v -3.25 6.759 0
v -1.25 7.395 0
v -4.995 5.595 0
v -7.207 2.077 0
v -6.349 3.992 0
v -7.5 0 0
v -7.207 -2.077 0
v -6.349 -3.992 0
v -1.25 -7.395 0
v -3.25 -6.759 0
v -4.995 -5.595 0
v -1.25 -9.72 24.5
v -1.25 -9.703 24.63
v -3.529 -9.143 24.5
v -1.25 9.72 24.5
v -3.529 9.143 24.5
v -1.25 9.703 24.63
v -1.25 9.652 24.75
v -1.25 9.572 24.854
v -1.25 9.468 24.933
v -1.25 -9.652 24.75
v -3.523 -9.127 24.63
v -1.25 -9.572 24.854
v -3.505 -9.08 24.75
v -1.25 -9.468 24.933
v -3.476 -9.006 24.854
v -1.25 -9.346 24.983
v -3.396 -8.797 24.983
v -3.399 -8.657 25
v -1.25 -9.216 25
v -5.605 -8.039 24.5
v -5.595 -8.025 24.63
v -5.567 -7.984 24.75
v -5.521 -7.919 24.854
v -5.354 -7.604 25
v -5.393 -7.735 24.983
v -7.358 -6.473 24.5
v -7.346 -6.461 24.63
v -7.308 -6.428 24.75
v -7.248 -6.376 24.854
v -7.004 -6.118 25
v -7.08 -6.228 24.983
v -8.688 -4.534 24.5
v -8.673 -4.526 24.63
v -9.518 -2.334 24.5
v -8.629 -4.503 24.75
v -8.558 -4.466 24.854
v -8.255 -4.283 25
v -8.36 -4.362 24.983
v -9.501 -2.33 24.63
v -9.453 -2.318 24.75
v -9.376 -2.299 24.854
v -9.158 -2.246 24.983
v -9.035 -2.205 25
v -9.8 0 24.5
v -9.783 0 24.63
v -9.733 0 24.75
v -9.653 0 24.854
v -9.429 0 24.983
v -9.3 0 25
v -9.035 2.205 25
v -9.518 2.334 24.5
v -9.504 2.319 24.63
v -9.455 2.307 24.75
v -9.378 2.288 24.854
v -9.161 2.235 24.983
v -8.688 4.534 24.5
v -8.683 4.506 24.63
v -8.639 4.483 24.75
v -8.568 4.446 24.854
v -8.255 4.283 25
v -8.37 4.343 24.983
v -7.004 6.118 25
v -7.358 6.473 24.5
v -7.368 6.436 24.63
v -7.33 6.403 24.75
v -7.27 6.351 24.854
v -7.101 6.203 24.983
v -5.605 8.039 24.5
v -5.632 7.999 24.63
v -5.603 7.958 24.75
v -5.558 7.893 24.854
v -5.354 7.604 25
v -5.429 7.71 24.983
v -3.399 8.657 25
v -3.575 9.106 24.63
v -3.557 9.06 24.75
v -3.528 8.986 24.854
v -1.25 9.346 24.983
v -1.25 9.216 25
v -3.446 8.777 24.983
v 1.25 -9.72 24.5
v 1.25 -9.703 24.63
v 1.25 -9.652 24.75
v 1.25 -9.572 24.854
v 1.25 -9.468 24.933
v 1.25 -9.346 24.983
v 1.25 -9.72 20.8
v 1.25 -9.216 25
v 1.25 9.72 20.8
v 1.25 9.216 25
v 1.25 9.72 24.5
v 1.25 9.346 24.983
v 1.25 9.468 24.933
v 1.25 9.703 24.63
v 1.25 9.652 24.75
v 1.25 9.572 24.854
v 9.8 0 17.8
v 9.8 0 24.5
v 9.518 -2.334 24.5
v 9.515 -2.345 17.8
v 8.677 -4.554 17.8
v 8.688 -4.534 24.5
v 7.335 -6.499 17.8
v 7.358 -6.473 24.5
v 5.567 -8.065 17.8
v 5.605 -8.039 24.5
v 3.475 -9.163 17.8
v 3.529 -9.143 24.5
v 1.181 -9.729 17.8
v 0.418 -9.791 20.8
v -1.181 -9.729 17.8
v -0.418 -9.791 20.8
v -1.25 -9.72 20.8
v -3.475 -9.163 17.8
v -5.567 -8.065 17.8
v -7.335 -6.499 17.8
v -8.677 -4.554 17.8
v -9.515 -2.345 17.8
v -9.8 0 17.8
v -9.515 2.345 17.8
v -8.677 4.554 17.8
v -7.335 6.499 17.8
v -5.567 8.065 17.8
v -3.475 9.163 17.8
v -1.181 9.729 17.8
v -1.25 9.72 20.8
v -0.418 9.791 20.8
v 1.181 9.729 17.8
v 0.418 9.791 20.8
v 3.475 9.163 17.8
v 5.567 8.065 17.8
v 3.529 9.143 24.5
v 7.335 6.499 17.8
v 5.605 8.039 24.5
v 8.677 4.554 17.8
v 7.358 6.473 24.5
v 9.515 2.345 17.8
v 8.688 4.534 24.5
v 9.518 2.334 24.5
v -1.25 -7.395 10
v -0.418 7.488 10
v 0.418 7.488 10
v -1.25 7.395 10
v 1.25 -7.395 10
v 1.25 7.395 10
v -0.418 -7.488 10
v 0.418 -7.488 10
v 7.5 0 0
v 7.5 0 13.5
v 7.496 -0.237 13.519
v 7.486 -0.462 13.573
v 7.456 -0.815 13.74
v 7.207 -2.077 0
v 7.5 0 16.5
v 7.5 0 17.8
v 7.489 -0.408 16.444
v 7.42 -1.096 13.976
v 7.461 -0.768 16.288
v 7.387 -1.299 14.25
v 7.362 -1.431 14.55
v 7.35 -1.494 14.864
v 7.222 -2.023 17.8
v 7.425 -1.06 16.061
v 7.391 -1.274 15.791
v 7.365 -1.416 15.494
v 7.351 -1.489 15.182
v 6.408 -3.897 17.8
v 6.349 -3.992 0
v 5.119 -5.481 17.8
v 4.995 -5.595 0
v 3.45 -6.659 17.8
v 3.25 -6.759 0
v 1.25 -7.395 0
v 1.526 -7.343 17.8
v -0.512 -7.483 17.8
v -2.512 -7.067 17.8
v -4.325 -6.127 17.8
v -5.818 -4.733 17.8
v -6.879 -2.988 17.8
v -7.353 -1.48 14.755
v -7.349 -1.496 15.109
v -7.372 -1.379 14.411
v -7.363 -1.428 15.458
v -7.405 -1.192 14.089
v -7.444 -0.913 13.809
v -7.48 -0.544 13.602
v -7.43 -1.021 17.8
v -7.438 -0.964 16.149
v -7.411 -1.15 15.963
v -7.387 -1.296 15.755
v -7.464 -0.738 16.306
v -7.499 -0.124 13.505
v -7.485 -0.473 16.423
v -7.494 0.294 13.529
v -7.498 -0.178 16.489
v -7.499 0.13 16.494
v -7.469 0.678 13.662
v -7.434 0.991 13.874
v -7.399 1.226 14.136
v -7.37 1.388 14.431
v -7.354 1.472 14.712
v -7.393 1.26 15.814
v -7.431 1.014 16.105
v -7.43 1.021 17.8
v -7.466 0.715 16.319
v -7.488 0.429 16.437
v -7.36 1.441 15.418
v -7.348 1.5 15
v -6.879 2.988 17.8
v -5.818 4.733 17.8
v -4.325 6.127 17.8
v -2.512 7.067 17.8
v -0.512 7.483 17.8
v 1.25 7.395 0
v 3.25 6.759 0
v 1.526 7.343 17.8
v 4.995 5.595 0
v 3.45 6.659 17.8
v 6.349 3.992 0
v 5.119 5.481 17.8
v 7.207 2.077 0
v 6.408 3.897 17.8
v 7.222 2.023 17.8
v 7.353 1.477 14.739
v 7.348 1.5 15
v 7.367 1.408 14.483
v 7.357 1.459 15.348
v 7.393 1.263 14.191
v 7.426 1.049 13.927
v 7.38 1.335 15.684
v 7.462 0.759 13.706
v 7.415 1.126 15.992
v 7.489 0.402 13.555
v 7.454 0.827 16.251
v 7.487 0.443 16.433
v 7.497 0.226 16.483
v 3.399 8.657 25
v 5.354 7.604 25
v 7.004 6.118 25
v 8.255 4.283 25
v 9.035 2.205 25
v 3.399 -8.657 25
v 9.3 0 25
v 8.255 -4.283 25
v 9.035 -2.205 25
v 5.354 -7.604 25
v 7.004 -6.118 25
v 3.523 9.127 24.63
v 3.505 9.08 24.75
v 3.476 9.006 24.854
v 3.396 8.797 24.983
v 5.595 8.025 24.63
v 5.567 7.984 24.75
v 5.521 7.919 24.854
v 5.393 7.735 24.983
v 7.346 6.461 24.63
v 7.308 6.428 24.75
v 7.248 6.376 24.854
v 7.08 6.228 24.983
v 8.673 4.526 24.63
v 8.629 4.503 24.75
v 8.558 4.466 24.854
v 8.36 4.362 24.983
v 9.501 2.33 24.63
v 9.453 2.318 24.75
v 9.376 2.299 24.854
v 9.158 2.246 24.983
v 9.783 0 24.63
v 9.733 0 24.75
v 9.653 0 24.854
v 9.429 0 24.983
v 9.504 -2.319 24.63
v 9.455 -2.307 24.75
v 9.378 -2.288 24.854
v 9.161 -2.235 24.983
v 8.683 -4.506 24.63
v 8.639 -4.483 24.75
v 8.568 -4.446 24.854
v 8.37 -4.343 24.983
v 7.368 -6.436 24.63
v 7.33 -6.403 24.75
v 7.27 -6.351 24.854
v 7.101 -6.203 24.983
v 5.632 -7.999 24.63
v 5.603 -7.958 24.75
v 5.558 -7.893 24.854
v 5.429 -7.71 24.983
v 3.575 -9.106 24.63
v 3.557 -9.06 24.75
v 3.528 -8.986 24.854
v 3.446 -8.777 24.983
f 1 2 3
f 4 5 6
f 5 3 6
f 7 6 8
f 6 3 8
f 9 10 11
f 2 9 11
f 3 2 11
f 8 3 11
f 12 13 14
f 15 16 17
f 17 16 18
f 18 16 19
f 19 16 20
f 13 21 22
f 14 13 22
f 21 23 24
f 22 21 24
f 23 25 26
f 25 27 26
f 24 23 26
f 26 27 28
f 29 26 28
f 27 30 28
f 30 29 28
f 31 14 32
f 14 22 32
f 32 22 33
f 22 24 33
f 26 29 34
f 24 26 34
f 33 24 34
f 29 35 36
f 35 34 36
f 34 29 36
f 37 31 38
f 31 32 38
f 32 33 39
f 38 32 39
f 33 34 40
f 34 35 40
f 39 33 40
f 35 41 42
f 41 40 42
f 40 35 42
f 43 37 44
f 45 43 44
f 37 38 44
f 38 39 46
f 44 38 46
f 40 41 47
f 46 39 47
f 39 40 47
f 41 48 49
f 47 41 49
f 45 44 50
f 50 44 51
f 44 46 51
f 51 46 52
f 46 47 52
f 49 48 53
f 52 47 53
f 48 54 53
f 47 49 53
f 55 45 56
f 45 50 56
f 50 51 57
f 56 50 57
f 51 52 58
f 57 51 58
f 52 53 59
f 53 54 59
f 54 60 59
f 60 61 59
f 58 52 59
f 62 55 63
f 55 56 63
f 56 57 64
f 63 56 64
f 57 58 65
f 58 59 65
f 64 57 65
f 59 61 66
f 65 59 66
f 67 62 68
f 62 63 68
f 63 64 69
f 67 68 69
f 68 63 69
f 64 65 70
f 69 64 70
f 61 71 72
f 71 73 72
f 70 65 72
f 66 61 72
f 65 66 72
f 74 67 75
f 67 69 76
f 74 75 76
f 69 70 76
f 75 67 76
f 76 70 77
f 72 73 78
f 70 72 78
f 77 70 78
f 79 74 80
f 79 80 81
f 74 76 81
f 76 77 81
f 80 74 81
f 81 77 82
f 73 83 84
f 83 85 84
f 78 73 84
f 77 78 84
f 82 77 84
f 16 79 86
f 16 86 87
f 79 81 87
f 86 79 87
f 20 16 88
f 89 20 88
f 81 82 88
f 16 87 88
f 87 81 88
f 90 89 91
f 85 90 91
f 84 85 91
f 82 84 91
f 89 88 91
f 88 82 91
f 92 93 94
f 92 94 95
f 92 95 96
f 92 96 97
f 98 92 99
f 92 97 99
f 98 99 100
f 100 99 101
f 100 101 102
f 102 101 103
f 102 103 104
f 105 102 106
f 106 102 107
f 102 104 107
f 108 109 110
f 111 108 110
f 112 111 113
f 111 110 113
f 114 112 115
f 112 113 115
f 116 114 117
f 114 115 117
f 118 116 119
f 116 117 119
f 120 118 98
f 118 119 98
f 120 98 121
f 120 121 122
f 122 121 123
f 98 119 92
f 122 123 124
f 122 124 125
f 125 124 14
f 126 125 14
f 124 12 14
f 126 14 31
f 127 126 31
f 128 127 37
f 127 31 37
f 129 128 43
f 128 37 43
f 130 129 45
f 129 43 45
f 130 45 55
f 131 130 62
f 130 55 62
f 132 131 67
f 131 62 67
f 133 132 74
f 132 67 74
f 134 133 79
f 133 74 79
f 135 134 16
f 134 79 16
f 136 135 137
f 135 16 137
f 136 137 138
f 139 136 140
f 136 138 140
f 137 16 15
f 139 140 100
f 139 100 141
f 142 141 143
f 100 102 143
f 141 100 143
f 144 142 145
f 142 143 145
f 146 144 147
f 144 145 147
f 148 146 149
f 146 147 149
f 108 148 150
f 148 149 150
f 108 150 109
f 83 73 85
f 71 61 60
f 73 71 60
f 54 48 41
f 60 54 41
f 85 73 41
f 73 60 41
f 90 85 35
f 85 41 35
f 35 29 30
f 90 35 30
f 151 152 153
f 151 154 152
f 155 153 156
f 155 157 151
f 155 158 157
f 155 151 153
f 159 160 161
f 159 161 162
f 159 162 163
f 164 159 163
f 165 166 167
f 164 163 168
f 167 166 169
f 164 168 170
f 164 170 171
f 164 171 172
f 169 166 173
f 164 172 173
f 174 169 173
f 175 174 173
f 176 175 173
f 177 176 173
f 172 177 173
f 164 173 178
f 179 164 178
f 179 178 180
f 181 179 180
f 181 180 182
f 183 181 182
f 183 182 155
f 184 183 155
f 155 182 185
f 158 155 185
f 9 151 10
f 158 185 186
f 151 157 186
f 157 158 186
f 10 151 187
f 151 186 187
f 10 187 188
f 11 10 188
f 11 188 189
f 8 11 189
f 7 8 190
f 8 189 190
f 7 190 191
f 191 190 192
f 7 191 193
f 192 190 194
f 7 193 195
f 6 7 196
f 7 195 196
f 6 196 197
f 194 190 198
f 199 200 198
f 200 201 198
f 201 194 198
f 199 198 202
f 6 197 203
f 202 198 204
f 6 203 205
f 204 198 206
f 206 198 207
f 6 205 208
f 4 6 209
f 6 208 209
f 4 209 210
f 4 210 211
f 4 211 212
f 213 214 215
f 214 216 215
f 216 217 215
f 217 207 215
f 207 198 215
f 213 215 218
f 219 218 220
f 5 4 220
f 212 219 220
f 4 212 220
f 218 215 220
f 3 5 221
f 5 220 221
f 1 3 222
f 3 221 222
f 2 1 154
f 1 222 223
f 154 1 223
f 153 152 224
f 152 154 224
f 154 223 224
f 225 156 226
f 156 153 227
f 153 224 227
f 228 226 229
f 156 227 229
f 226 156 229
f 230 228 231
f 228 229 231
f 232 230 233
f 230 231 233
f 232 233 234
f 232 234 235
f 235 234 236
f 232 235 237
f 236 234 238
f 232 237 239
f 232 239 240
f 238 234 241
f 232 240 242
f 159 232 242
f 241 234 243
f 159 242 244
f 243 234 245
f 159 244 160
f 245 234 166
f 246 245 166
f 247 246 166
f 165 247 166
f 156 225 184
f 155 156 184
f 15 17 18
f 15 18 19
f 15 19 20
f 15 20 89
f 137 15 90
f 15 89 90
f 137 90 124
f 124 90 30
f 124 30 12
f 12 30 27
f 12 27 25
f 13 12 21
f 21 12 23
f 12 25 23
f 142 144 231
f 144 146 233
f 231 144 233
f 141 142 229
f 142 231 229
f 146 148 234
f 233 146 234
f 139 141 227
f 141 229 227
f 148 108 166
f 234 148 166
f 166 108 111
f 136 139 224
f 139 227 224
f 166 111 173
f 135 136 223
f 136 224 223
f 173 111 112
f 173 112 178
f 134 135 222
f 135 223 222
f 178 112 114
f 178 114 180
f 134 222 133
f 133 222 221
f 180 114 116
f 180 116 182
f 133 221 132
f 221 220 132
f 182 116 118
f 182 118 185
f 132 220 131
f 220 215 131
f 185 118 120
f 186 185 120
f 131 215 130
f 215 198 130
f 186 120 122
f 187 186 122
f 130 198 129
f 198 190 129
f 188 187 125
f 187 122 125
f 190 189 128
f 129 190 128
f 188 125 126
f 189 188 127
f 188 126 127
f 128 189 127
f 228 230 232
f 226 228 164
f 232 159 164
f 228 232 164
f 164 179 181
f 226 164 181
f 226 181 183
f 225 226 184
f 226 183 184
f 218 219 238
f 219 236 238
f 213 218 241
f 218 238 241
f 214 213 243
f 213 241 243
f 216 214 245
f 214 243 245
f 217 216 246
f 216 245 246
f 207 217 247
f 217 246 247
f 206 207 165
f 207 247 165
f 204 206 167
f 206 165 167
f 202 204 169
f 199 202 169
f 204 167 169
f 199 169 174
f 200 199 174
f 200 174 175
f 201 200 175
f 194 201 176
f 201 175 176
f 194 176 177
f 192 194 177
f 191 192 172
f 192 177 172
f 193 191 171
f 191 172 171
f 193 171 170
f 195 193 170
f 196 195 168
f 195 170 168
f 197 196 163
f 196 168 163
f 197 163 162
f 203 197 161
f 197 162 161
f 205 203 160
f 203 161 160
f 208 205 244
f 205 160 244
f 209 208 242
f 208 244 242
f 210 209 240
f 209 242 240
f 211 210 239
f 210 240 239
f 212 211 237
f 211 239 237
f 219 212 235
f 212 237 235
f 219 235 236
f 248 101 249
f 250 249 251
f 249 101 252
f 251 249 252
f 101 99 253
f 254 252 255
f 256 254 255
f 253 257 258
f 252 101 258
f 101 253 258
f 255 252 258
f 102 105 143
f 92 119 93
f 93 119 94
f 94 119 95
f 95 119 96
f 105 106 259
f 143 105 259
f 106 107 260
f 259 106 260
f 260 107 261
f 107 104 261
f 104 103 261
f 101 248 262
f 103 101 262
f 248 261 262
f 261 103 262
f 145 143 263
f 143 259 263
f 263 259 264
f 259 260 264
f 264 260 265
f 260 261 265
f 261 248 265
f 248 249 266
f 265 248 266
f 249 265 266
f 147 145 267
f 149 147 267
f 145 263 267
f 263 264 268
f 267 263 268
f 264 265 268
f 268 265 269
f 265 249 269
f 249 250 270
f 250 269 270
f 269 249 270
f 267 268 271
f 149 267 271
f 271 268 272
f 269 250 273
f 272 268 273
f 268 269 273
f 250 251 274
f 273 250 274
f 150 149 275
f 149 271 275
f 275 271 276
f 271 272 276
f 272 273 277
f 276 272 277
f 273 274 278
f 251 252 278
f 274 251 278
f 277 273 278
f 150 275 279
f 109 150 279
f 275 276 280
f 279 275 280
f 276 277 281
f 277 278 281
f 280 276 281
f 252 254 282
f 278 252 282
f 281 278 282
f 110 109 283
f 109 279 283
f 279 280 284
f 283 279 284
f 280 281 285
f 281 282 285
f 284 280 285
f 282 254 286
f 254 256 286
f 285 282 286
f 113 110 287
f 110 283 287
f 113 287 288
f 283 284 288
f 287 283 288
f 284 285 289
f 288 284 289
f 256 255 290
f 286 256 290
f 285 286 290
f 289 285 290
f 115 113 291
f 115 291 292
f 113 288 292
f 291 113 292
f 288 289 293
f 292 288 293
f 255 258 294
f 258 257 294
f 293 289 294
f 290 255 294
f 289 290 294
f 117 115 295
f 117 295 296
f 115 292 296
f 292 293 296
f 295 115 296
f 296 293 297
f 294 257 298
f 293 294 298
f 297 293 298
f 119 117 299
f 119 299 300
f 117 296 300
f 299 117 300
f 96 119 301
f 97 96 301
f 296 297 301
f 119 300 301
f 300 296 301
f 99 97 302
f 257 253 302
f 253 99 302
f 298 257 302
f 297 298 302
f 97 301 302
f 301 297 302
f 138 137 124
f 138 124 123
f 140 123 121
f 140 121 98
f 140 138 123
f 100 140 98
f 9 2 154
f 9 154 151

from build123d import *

# Parameters (mm, degrees)
F3_DEPTH = 4.2
F4_R     = 0.5
F5_W     = 2.5
F5_H     = 20
F6_DEPTH = 10
F7_R     = 1.5
F8_DEPTH = 12.5


with BuildPart() as f1:
    # F0 (on Front) → F1 (revolve)
    with BuildSketch(Plane.XZ):
        Polygon((0, 25), (0, 0), (7.5, 0), (7.5, 17.8), (9.8, 17.8), (9.8, 25), align=None)
    revolve(axis=Axis((0, 0, 12.5), (0, 0, -1)))

    # F2 (on face) → F3 (cut)
    with BuildSketch(Plane.XY.offset(25)):
        with BuildLine():
            Line((1.25, 15), (-1.25, 15))
            Line((-1.25, 15), (-1.25, 9.7199537036))
            ThreePointArc((-1.25, 9.7199537036), (0, 9.8), (1.25, 9.7199537036))
            Line((1.25, 9.7199537036), (1.25, 15))
        make_face()
        with BuildLine():
            ThreePointArc((1.25, 9.7199537036), (0, 9.8), (-1.25, 9.7199537036))
            Line((-1.25, 9.7199537036), (-1.25, -9.7199537036))
            ThreePointArc((-1.25, -9.7199537036), (0, -9.8), (1.25, -9.7199537036))
            Line((1.25, -9.7199537036), (1.25, 9.7199537036))
        make_face()
        with BuildLine():
            ThreePointArc((1.25, -9.7199537036), (0, -9.8), (-1.25, -9.7199537036))
            Line((-1.25, -9.7199537036), (-1.25, -15))
            Line((-1.25, -15), (1.25, -15))
            Line((1.25, -15), (1.25, -9.7199537036))
        make_face()
    extrude(amount=-F3_DEPTH, mode=Mode.SUBTRACT)

    # F4
    f4_edges = [f1.edges().sort_by_distance(p)[0] for p in [
        (-9.8, 0, 25),
        (7.358329, -6.472635, 25),
        (7.358329, 6.472635, 25),
    ]]
    fillet(f4_edges, radius=F4_R)

    # F5 (on face) → F6 (cut)
    with BuildSketch(Plane(origin=(0, 0, 0), x_dir=(1, 0, 0), z_dir=(0, 0, -1))):
        Rectangle(F5_W, F5_H)
    extrude(amount=-F6_DEPTH, mode=Mode.SUBTRACT)

    # F7 (on Right) → F8 (cut, symmetric)
    with BuildSketch(Plane.YZ):
        with Locations((0, 15)):
            Circle(F7_R)
    extrude(amount=F8_DEPTH, both=True, mode=Mode.SUBTRACT)


solid = f1.part
